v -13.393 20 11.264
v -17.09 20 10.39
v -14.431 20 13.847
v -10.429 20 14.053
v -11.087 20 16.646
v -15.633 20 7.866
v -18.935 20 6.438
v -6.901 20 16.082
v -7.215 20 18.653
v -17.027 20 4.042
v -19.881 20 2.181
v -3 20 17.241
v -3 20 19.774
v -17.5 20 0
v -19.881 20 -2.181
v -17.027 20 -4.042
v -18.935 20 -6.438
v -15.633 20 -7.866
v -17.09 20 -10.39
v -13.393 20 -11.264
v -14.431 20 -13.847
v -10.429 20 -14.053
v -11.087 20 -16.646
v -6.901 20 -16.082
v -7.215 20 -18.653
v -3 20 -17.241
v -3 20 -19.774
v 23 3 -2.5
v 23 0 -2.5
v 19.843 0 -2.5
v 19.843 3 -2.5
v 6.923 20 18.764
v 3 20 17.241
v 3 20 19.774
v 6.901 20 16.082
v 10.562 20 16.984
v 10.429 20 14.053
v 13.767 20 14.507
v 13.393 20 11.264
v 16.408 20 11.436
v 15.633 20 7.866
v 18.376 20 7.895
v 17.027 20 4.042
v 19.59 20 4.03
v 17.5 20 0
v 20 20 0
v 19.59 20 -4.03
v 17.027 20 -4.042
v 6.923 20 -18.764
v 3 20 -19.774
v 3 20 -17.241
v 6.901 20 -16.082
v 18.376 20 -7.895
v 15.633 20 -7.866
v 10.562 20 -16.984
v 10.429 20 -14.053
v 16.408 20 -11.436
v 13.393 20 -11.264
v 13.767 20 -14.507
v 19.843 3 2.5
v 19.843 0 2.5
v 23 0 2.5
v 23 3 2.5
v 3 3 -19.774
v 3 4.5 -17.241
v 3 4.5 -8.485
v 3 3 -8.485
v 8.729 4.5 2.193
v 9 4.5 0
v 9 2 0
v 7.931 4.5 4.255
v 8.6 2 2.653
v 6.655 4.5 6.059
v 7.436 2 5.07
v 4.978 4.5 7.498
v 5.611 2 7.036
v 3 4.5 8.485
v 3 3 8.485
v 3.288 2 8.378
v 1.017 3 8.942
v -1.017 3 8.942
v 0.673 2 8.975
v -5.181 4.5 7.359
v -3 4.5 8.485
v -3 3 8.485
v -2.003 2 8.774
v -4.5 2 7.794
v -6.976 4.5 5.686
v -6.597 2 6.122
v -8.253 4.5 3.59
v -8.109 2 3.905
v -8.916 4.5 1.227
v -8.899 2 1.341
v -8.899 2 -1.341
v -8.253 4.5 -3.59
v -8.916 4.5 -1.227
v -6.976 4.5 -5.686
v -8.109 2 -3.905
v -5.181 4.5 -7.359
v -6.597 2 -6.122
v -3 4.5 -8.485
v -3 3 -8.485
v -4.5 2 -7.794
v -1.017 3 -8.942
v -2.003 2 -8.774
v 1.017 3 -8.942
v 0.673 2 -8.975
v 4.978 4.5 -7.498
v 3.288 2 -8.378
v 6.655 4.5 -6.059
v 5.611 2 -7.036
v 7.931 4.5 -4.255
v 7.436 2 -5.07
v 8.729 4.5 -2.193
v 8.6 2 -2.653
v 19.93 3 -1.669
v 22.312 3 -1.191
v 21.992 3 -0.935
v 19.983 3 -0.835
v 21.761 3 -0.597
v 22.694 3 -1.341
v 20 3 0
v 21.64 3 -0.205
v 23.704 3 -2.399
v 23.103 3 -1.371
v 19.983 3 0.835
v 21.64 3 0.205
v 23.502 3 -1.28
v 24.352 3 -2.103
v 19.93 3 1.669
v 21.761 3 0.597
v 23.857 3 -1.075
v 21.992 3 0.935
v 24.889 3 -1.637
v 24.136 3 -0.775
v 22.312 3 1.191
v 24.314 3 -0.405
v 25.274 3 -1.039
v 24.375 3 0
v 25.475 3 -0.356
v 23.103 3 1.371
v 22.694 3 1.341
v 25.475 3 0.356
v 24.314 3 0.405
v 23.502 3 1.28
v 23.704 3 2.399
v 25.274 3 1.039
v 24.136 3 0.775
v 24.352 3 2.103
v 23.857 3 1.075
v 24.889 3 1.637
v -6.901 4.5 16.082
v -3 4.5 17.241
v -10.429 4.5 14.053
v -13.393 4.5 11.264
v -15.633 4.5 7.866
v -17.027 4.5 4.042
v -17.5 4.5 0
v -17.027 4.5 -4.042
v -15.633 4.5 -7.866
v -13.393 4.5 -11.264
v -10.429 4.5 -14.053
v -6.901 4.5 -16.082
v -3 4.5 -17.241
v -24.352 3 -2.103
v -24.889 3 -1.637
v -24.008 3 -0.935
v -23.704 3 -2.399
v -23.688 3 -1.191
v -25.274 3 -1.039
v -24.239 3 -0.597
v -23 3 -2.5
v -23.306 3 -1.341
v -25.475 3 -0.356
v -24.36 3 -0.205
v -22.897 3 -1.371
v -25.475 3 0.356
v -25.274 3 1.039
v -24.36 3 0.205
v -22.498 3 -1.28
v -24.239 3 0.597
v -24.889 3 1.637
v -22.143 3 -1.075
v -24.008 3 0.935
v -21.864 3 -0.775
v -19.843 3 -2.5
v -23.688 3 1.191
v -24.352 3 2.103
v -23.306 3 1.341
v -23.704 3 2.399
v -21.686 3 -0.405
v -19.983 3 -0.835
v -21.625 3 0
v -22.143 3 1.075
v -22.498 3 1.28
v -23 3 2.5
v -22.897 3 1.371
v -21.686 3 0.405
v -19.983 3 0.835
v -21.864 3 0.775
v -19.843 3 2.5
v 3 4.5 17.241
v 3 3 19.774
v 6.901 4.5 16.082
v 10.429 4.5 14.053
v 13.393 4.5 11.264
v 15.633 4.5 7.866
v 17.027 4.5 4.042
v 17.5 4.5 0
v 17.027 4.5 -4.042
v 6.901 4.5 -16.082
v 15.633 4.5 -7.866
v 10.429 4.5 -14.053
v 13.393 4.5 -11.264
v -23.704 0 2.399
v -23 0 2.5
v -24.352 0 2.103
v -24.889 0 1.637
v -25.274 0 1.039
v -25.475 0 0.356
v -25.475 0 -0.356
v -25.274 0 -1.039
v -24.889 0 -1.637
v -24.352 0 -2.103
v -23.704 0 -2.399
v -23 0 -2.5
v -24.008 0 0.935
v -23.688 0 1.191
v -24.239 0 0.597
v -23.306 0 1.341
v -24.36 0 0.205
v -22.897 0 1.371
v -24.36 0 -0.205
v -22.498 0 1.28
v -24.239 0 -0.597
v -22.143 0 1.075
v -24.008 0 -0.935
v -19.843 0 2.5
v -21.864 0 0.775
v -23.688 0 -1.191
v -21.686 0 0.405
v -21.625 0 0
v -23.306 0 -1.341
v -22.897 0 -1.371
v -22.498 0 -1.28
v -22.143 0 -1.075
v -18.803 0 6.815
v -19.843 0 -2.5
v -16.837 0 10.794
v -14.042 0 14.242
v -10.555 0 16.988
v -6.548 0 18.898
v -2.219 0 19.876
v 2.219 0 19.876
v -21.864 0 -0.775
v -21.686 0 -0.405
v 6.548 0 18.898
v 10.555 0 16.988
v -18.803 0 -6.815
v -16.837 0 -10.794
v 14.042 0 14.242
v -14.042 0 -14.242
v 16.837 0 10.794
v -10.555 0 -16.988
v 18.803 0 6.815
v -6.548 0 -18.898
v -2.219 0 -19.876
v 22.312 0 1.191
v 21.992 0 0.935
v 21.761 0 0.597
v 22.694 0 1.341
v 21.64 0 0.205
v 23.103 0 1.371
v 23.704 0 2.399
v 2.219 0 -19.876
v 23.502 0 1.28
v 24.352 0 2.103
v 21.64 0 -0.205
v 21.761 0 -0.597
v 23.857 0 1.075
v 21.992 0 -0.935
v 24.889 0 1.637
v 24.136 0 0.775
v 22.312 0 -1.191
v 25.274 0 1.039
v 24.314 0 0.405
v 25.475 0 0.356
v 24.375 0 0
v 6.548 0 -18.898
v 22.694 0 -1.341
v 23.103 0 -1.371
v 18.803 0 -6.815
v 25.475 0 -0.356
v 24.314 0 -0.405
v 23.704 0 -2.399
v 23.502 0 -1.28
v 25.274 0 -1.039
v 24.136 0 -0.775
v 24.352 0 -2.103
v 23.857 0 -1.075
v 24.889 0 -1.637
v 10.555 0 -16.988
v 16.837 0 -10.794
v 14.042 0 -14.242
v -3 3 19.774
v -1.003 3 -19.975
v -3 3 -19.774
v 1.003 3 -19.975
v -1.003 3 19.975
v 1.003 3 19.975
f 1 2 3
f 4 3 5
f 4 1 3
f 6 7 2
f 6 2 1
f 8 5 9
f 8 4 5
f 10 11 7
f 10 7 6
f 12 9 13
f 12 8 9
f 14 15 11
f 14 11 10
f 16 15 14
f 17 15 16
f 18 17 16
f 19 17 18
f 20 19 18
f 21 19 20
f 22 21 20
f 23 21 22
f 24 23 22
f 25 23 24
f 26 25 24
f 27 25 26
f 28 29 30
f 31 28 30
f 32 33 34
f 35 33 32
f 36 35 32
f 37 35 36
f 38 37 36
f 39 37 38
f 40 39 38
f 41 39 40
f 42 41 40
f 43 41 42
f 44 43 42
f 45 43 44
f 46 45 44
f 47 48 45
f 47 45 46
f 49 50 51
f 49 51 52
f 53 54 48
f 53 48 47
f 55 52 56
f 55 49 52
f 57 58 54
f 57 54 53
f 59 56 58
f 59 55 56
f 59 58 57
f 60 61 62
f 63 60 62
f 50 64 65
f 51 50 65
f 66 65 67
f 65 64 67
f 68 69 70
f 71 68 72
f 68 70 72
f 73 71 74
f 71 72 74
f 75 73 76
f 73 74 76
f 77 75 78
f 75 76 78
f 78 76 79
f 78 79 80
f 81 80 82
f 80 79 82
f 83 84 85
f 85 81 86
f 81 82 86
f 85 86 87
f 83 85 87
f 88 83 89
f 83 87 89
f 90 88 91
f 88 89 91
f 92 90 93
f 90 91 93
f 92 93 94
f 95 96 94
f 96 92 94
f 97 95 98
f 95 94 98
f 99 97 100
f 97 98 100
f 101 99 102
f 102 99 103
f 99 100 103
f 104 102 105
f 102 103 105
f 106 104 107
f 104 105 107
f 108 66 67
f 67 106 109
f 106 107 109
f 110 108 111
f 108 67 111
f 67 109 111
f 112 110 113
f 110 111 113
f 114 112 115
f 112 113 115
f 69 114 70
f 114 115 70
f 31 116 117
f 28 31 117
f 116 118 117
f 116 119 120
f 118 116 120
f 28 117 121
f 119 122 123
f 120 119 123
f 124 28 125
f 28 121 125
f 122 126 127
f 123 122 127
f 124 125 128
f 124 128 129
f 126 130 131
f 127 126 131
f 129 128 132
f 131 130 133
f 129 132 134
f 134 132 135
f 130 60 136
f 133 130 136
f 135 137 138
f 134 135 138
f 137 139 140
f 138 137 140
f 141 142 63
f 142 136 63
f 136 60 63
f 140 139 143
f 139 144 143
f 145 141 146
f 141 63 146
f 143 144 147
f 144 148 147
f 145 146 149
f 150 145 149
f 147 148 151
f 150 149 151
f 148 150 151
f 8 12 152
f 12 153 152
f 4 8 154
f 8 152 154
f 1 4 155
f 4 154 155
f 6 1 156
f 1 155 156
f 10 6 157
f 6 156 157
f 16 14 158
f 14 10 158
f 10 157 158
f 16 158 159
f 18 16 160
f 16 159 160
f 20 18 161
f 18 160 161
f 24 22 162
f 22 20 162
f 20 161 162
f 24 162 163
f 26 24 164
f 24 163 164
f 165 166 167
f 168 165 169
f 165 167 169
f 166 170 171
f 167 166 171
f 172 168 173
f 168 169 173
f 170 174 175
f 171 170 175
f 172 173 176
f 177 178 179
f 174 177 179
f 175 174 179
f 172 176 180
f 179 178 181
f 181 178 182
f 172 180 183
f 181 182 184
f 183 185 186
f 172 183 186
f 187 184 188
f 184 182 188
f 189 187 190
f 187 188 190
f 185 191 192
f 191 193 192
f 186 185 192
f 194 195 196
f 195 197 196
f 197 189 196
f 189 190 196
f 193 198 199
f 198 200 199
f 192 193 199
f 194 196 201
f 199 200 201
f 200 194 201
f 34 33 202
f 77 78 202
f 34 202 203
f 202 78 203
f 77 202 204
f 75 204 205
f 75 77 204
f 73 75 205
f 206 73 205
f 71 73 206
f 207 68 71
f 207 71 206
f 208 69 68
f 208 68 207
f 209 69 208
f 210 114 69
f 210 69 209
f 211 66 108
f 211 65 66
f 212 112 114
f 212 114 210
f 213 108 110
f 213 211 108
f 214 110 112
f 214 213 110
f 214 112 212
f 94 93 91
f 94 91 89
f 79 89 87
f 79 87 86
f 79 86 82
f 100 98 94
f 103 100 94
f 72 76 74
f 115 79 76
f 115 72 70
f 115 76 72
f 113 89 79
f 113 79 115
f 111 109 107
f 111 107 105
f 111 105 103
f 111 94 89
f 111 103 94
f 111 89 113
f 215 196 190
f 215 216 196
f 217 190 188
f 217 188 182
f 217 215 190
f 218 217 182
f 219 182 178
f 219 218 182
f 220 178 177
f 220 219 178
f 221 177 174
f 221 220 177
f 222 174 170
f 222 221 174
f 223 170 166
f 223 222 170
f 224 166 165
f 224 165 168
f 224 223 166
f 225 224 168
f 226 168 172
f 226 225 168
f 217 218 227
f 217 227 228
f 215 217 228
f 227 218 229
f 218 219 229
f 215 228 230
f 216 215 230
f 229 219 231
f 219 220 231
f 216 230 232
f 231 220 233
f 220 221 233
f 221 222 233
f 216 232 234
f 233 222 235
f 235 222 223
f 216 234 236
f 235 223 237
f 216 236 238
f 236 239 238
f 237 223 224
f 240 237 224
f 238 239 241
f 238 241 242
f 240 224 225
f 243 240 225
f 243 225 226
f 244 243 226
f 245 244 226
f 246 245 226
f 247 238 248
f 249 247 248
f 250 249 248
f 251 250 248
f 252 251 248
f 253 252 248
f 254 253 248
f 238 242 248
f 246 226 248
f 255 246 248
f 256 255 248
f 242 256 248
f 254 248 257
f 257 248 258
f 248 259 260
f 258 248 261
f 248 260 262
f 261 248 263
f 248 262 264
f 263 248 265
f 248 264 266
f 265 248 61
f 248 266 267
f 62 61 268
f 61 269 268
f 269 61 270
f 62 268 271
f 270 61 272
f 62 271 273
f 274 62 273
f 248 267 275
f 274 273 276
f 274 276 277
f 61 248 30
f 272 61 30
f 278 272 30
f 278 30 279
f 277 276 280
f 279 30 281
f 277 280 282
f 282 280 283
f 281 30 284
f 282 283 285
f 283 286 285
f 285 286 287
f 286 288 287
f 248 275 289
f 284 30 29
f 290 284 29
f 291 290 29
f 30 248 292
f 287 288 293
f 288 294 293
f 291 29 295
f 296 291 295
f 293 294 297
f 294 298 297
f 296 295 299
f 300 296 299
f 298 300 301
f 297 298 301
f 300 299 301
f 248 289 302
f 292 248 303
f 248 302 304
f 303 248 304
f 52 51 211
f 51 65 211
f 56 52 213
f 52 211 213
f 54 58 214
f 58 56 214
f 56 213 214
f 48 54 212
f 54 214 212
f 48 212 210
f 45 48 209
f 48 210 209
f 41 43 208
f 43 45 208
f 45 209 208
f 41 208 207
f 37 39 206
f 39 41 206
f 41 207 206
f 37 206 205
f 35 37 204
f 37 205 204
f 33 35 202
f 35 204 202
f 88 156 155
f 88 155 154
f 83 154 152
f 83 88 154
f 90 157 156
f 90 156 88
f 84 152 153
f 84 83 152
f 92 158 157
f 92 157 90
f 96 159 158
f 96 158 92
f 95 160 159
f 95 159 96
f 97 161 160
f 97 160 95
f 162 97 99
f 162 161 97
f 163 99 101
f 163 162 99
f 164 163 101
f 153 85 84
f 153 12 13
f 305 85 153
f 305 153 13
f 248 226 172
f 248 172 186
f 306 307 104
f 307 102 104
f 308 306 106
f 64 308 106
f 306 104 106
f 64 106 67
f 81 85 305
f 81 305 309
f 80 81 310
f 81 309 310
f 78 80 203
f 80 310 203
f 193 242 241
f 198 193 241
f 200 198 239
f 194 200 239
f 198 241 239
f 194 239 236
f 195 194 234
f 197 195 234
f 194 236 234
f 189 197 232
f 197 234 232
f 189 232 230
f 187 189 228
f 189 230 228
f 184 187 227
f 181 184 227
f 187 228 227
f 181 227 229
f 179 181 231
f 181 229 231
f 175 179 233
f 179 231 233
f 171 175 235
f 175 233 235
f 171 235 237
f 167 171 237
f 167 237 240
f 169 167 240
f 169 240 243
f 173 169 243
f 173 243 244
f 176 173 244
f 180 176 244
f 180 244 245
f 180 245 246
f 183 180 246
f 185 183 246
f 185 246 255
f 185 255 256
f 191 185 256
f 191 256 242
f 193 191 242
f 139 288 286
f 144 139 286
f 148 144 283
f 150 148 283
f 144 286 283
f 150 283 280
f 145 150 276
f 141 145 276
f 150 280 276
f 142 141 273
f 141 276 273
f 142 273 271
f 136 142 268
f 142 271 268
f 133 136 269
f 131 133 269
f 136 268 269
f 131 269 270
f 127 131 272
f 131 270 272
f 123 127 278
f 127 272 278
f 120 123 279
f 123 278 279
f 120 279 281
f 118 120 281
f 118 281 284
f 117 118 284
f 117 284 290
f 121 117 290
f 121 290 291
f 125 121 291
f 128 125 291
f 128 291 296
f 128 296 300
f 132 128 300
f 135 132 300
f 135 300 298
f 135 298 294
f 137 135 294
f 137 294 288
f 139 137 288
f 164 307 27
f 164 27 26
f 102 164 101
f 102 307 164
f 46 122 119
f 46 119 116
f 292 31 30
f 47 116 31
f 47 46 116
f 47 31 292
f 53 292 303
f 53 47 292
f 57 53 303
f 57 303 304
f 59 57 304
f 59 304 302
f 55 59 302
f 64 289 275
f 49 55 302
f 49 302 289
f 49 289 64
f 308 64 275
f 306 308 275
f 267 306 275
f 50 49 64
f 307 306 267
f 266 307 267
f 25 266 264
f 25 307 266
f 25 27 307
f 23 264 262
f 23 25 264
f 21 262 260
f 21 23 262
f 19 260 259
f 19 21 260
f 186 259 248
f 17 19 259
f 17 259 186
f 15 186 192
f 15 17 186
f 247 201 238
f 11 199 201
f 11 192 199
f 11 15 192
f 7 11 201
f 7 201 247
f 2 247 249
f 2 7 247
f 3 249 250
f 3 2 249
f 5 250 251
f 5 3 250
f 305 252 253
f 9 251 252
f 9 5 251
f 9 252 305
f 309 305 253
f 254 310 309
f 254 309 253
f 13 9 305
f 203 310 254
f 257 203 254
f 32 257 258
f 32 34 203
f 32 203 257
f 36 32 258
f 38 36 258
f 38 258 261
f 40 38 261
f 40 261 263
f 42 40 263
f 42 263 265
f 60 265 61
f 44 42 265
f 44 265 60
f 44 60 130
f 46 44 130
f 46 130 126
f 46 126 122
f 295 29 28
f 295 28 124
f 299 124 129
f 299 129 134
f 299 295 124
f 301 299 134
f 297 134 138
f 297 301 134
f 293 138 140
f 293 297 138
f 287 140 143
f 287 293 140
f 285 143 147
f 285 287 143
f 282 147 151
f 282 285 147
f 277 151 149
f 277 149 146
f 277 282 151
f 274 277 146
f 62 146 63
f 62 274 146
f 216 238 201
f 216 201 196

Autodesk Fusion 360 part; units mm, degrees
sketch "Sketch2" plane through (0, 0, 0) normal (0, 0, 1) x (1, 0, 0)
  line L0 (0, -19) -> (0, -17)
  line L1 (0, -17) -> (0, 22) construction
  line L2 (-22, 0) -> (25, 0) construction
  line L3 (0, 0) -> (5, 0)
  line L4 (20, 0) -> (20, 20)
  line L5 (0, 0) -> (20, 0)
  line L6 (20, 20) -> (17.5, 20)
  line L7 (17.5, 20) -> (17.5, 4.5)
  line L8 (17.5, 4.5) -> (9, 4.5)
  line L9 (9, 4.5) -> (9, 2)
  line L10 (9, 2) -> (0, 2)
  line L11 (0, 2) -> (0, 0)
  dimension "d76" = 20
  dimension "d77" = 20
  dimension "d78" = 2
  dimension "d79" = 4.5
  dimension "d80" = 17.5
  dimension "d81" = 9
revolve "Revolve1" add sketch "Sketch2" angle 360 about axis through (0, -17, 0) along (0, 1, 0)
sketch "Sketch3" plane through (0, 0, 0) normal (0, -1, 0) x (1, 0, 0)
  circle A0 centre (0, 0) radius 20
  line L0 (3, -19.7737) -> (3, 19.7737)
  circle A1 centre (0, 0) radius 20
  line L1 (0, 1.75) -> (0, 22.5)
  line L2 (-3, -19.7737) -> (-3, 19.7737)
  line L3 (-19.8431, 2.5) -> (-23, 2.5)
  arc A2 (-23, 2.5) -> (-23, -2.5) centre (-23, 0) ccw
  line L4 (-23, -2.5) -> (-19.8431, -2.5)
  line L5 (-15, 0) -> (-23, 0) construction
  arc A3 (23, -2.5) -> (23, 2.5) centre (23, 0) ccw
  line L6 (23, -2.5) -> (19.8431, -2.5)
  line L7 (15, 0) -> (23, 0) construction
  line L8 (19.8431, 2.5) -> (23, 2.5)
  circle A4 centre (-23, 0) radius 1.375
  circle A5 centre (23, 0) radius 1.375
  dimension "d83" = 6
  dimension "d84" = 5
  dimension "d88" = 2.75
extrude "Extrude4" cut sketch "Sketch3" against normal blind 17 from surface at -3 contours A0 L0 A1 L2
extrude "Extrude5" add sketch "Sketch3" against normal blind 3 contours A0 A1 A3 L6 L8 | A0 A1 L3 A2 L4
sketch "Sketch4" plane through (0, 0, 0) normal (0, 0, 1) x (1, 0, 0)
